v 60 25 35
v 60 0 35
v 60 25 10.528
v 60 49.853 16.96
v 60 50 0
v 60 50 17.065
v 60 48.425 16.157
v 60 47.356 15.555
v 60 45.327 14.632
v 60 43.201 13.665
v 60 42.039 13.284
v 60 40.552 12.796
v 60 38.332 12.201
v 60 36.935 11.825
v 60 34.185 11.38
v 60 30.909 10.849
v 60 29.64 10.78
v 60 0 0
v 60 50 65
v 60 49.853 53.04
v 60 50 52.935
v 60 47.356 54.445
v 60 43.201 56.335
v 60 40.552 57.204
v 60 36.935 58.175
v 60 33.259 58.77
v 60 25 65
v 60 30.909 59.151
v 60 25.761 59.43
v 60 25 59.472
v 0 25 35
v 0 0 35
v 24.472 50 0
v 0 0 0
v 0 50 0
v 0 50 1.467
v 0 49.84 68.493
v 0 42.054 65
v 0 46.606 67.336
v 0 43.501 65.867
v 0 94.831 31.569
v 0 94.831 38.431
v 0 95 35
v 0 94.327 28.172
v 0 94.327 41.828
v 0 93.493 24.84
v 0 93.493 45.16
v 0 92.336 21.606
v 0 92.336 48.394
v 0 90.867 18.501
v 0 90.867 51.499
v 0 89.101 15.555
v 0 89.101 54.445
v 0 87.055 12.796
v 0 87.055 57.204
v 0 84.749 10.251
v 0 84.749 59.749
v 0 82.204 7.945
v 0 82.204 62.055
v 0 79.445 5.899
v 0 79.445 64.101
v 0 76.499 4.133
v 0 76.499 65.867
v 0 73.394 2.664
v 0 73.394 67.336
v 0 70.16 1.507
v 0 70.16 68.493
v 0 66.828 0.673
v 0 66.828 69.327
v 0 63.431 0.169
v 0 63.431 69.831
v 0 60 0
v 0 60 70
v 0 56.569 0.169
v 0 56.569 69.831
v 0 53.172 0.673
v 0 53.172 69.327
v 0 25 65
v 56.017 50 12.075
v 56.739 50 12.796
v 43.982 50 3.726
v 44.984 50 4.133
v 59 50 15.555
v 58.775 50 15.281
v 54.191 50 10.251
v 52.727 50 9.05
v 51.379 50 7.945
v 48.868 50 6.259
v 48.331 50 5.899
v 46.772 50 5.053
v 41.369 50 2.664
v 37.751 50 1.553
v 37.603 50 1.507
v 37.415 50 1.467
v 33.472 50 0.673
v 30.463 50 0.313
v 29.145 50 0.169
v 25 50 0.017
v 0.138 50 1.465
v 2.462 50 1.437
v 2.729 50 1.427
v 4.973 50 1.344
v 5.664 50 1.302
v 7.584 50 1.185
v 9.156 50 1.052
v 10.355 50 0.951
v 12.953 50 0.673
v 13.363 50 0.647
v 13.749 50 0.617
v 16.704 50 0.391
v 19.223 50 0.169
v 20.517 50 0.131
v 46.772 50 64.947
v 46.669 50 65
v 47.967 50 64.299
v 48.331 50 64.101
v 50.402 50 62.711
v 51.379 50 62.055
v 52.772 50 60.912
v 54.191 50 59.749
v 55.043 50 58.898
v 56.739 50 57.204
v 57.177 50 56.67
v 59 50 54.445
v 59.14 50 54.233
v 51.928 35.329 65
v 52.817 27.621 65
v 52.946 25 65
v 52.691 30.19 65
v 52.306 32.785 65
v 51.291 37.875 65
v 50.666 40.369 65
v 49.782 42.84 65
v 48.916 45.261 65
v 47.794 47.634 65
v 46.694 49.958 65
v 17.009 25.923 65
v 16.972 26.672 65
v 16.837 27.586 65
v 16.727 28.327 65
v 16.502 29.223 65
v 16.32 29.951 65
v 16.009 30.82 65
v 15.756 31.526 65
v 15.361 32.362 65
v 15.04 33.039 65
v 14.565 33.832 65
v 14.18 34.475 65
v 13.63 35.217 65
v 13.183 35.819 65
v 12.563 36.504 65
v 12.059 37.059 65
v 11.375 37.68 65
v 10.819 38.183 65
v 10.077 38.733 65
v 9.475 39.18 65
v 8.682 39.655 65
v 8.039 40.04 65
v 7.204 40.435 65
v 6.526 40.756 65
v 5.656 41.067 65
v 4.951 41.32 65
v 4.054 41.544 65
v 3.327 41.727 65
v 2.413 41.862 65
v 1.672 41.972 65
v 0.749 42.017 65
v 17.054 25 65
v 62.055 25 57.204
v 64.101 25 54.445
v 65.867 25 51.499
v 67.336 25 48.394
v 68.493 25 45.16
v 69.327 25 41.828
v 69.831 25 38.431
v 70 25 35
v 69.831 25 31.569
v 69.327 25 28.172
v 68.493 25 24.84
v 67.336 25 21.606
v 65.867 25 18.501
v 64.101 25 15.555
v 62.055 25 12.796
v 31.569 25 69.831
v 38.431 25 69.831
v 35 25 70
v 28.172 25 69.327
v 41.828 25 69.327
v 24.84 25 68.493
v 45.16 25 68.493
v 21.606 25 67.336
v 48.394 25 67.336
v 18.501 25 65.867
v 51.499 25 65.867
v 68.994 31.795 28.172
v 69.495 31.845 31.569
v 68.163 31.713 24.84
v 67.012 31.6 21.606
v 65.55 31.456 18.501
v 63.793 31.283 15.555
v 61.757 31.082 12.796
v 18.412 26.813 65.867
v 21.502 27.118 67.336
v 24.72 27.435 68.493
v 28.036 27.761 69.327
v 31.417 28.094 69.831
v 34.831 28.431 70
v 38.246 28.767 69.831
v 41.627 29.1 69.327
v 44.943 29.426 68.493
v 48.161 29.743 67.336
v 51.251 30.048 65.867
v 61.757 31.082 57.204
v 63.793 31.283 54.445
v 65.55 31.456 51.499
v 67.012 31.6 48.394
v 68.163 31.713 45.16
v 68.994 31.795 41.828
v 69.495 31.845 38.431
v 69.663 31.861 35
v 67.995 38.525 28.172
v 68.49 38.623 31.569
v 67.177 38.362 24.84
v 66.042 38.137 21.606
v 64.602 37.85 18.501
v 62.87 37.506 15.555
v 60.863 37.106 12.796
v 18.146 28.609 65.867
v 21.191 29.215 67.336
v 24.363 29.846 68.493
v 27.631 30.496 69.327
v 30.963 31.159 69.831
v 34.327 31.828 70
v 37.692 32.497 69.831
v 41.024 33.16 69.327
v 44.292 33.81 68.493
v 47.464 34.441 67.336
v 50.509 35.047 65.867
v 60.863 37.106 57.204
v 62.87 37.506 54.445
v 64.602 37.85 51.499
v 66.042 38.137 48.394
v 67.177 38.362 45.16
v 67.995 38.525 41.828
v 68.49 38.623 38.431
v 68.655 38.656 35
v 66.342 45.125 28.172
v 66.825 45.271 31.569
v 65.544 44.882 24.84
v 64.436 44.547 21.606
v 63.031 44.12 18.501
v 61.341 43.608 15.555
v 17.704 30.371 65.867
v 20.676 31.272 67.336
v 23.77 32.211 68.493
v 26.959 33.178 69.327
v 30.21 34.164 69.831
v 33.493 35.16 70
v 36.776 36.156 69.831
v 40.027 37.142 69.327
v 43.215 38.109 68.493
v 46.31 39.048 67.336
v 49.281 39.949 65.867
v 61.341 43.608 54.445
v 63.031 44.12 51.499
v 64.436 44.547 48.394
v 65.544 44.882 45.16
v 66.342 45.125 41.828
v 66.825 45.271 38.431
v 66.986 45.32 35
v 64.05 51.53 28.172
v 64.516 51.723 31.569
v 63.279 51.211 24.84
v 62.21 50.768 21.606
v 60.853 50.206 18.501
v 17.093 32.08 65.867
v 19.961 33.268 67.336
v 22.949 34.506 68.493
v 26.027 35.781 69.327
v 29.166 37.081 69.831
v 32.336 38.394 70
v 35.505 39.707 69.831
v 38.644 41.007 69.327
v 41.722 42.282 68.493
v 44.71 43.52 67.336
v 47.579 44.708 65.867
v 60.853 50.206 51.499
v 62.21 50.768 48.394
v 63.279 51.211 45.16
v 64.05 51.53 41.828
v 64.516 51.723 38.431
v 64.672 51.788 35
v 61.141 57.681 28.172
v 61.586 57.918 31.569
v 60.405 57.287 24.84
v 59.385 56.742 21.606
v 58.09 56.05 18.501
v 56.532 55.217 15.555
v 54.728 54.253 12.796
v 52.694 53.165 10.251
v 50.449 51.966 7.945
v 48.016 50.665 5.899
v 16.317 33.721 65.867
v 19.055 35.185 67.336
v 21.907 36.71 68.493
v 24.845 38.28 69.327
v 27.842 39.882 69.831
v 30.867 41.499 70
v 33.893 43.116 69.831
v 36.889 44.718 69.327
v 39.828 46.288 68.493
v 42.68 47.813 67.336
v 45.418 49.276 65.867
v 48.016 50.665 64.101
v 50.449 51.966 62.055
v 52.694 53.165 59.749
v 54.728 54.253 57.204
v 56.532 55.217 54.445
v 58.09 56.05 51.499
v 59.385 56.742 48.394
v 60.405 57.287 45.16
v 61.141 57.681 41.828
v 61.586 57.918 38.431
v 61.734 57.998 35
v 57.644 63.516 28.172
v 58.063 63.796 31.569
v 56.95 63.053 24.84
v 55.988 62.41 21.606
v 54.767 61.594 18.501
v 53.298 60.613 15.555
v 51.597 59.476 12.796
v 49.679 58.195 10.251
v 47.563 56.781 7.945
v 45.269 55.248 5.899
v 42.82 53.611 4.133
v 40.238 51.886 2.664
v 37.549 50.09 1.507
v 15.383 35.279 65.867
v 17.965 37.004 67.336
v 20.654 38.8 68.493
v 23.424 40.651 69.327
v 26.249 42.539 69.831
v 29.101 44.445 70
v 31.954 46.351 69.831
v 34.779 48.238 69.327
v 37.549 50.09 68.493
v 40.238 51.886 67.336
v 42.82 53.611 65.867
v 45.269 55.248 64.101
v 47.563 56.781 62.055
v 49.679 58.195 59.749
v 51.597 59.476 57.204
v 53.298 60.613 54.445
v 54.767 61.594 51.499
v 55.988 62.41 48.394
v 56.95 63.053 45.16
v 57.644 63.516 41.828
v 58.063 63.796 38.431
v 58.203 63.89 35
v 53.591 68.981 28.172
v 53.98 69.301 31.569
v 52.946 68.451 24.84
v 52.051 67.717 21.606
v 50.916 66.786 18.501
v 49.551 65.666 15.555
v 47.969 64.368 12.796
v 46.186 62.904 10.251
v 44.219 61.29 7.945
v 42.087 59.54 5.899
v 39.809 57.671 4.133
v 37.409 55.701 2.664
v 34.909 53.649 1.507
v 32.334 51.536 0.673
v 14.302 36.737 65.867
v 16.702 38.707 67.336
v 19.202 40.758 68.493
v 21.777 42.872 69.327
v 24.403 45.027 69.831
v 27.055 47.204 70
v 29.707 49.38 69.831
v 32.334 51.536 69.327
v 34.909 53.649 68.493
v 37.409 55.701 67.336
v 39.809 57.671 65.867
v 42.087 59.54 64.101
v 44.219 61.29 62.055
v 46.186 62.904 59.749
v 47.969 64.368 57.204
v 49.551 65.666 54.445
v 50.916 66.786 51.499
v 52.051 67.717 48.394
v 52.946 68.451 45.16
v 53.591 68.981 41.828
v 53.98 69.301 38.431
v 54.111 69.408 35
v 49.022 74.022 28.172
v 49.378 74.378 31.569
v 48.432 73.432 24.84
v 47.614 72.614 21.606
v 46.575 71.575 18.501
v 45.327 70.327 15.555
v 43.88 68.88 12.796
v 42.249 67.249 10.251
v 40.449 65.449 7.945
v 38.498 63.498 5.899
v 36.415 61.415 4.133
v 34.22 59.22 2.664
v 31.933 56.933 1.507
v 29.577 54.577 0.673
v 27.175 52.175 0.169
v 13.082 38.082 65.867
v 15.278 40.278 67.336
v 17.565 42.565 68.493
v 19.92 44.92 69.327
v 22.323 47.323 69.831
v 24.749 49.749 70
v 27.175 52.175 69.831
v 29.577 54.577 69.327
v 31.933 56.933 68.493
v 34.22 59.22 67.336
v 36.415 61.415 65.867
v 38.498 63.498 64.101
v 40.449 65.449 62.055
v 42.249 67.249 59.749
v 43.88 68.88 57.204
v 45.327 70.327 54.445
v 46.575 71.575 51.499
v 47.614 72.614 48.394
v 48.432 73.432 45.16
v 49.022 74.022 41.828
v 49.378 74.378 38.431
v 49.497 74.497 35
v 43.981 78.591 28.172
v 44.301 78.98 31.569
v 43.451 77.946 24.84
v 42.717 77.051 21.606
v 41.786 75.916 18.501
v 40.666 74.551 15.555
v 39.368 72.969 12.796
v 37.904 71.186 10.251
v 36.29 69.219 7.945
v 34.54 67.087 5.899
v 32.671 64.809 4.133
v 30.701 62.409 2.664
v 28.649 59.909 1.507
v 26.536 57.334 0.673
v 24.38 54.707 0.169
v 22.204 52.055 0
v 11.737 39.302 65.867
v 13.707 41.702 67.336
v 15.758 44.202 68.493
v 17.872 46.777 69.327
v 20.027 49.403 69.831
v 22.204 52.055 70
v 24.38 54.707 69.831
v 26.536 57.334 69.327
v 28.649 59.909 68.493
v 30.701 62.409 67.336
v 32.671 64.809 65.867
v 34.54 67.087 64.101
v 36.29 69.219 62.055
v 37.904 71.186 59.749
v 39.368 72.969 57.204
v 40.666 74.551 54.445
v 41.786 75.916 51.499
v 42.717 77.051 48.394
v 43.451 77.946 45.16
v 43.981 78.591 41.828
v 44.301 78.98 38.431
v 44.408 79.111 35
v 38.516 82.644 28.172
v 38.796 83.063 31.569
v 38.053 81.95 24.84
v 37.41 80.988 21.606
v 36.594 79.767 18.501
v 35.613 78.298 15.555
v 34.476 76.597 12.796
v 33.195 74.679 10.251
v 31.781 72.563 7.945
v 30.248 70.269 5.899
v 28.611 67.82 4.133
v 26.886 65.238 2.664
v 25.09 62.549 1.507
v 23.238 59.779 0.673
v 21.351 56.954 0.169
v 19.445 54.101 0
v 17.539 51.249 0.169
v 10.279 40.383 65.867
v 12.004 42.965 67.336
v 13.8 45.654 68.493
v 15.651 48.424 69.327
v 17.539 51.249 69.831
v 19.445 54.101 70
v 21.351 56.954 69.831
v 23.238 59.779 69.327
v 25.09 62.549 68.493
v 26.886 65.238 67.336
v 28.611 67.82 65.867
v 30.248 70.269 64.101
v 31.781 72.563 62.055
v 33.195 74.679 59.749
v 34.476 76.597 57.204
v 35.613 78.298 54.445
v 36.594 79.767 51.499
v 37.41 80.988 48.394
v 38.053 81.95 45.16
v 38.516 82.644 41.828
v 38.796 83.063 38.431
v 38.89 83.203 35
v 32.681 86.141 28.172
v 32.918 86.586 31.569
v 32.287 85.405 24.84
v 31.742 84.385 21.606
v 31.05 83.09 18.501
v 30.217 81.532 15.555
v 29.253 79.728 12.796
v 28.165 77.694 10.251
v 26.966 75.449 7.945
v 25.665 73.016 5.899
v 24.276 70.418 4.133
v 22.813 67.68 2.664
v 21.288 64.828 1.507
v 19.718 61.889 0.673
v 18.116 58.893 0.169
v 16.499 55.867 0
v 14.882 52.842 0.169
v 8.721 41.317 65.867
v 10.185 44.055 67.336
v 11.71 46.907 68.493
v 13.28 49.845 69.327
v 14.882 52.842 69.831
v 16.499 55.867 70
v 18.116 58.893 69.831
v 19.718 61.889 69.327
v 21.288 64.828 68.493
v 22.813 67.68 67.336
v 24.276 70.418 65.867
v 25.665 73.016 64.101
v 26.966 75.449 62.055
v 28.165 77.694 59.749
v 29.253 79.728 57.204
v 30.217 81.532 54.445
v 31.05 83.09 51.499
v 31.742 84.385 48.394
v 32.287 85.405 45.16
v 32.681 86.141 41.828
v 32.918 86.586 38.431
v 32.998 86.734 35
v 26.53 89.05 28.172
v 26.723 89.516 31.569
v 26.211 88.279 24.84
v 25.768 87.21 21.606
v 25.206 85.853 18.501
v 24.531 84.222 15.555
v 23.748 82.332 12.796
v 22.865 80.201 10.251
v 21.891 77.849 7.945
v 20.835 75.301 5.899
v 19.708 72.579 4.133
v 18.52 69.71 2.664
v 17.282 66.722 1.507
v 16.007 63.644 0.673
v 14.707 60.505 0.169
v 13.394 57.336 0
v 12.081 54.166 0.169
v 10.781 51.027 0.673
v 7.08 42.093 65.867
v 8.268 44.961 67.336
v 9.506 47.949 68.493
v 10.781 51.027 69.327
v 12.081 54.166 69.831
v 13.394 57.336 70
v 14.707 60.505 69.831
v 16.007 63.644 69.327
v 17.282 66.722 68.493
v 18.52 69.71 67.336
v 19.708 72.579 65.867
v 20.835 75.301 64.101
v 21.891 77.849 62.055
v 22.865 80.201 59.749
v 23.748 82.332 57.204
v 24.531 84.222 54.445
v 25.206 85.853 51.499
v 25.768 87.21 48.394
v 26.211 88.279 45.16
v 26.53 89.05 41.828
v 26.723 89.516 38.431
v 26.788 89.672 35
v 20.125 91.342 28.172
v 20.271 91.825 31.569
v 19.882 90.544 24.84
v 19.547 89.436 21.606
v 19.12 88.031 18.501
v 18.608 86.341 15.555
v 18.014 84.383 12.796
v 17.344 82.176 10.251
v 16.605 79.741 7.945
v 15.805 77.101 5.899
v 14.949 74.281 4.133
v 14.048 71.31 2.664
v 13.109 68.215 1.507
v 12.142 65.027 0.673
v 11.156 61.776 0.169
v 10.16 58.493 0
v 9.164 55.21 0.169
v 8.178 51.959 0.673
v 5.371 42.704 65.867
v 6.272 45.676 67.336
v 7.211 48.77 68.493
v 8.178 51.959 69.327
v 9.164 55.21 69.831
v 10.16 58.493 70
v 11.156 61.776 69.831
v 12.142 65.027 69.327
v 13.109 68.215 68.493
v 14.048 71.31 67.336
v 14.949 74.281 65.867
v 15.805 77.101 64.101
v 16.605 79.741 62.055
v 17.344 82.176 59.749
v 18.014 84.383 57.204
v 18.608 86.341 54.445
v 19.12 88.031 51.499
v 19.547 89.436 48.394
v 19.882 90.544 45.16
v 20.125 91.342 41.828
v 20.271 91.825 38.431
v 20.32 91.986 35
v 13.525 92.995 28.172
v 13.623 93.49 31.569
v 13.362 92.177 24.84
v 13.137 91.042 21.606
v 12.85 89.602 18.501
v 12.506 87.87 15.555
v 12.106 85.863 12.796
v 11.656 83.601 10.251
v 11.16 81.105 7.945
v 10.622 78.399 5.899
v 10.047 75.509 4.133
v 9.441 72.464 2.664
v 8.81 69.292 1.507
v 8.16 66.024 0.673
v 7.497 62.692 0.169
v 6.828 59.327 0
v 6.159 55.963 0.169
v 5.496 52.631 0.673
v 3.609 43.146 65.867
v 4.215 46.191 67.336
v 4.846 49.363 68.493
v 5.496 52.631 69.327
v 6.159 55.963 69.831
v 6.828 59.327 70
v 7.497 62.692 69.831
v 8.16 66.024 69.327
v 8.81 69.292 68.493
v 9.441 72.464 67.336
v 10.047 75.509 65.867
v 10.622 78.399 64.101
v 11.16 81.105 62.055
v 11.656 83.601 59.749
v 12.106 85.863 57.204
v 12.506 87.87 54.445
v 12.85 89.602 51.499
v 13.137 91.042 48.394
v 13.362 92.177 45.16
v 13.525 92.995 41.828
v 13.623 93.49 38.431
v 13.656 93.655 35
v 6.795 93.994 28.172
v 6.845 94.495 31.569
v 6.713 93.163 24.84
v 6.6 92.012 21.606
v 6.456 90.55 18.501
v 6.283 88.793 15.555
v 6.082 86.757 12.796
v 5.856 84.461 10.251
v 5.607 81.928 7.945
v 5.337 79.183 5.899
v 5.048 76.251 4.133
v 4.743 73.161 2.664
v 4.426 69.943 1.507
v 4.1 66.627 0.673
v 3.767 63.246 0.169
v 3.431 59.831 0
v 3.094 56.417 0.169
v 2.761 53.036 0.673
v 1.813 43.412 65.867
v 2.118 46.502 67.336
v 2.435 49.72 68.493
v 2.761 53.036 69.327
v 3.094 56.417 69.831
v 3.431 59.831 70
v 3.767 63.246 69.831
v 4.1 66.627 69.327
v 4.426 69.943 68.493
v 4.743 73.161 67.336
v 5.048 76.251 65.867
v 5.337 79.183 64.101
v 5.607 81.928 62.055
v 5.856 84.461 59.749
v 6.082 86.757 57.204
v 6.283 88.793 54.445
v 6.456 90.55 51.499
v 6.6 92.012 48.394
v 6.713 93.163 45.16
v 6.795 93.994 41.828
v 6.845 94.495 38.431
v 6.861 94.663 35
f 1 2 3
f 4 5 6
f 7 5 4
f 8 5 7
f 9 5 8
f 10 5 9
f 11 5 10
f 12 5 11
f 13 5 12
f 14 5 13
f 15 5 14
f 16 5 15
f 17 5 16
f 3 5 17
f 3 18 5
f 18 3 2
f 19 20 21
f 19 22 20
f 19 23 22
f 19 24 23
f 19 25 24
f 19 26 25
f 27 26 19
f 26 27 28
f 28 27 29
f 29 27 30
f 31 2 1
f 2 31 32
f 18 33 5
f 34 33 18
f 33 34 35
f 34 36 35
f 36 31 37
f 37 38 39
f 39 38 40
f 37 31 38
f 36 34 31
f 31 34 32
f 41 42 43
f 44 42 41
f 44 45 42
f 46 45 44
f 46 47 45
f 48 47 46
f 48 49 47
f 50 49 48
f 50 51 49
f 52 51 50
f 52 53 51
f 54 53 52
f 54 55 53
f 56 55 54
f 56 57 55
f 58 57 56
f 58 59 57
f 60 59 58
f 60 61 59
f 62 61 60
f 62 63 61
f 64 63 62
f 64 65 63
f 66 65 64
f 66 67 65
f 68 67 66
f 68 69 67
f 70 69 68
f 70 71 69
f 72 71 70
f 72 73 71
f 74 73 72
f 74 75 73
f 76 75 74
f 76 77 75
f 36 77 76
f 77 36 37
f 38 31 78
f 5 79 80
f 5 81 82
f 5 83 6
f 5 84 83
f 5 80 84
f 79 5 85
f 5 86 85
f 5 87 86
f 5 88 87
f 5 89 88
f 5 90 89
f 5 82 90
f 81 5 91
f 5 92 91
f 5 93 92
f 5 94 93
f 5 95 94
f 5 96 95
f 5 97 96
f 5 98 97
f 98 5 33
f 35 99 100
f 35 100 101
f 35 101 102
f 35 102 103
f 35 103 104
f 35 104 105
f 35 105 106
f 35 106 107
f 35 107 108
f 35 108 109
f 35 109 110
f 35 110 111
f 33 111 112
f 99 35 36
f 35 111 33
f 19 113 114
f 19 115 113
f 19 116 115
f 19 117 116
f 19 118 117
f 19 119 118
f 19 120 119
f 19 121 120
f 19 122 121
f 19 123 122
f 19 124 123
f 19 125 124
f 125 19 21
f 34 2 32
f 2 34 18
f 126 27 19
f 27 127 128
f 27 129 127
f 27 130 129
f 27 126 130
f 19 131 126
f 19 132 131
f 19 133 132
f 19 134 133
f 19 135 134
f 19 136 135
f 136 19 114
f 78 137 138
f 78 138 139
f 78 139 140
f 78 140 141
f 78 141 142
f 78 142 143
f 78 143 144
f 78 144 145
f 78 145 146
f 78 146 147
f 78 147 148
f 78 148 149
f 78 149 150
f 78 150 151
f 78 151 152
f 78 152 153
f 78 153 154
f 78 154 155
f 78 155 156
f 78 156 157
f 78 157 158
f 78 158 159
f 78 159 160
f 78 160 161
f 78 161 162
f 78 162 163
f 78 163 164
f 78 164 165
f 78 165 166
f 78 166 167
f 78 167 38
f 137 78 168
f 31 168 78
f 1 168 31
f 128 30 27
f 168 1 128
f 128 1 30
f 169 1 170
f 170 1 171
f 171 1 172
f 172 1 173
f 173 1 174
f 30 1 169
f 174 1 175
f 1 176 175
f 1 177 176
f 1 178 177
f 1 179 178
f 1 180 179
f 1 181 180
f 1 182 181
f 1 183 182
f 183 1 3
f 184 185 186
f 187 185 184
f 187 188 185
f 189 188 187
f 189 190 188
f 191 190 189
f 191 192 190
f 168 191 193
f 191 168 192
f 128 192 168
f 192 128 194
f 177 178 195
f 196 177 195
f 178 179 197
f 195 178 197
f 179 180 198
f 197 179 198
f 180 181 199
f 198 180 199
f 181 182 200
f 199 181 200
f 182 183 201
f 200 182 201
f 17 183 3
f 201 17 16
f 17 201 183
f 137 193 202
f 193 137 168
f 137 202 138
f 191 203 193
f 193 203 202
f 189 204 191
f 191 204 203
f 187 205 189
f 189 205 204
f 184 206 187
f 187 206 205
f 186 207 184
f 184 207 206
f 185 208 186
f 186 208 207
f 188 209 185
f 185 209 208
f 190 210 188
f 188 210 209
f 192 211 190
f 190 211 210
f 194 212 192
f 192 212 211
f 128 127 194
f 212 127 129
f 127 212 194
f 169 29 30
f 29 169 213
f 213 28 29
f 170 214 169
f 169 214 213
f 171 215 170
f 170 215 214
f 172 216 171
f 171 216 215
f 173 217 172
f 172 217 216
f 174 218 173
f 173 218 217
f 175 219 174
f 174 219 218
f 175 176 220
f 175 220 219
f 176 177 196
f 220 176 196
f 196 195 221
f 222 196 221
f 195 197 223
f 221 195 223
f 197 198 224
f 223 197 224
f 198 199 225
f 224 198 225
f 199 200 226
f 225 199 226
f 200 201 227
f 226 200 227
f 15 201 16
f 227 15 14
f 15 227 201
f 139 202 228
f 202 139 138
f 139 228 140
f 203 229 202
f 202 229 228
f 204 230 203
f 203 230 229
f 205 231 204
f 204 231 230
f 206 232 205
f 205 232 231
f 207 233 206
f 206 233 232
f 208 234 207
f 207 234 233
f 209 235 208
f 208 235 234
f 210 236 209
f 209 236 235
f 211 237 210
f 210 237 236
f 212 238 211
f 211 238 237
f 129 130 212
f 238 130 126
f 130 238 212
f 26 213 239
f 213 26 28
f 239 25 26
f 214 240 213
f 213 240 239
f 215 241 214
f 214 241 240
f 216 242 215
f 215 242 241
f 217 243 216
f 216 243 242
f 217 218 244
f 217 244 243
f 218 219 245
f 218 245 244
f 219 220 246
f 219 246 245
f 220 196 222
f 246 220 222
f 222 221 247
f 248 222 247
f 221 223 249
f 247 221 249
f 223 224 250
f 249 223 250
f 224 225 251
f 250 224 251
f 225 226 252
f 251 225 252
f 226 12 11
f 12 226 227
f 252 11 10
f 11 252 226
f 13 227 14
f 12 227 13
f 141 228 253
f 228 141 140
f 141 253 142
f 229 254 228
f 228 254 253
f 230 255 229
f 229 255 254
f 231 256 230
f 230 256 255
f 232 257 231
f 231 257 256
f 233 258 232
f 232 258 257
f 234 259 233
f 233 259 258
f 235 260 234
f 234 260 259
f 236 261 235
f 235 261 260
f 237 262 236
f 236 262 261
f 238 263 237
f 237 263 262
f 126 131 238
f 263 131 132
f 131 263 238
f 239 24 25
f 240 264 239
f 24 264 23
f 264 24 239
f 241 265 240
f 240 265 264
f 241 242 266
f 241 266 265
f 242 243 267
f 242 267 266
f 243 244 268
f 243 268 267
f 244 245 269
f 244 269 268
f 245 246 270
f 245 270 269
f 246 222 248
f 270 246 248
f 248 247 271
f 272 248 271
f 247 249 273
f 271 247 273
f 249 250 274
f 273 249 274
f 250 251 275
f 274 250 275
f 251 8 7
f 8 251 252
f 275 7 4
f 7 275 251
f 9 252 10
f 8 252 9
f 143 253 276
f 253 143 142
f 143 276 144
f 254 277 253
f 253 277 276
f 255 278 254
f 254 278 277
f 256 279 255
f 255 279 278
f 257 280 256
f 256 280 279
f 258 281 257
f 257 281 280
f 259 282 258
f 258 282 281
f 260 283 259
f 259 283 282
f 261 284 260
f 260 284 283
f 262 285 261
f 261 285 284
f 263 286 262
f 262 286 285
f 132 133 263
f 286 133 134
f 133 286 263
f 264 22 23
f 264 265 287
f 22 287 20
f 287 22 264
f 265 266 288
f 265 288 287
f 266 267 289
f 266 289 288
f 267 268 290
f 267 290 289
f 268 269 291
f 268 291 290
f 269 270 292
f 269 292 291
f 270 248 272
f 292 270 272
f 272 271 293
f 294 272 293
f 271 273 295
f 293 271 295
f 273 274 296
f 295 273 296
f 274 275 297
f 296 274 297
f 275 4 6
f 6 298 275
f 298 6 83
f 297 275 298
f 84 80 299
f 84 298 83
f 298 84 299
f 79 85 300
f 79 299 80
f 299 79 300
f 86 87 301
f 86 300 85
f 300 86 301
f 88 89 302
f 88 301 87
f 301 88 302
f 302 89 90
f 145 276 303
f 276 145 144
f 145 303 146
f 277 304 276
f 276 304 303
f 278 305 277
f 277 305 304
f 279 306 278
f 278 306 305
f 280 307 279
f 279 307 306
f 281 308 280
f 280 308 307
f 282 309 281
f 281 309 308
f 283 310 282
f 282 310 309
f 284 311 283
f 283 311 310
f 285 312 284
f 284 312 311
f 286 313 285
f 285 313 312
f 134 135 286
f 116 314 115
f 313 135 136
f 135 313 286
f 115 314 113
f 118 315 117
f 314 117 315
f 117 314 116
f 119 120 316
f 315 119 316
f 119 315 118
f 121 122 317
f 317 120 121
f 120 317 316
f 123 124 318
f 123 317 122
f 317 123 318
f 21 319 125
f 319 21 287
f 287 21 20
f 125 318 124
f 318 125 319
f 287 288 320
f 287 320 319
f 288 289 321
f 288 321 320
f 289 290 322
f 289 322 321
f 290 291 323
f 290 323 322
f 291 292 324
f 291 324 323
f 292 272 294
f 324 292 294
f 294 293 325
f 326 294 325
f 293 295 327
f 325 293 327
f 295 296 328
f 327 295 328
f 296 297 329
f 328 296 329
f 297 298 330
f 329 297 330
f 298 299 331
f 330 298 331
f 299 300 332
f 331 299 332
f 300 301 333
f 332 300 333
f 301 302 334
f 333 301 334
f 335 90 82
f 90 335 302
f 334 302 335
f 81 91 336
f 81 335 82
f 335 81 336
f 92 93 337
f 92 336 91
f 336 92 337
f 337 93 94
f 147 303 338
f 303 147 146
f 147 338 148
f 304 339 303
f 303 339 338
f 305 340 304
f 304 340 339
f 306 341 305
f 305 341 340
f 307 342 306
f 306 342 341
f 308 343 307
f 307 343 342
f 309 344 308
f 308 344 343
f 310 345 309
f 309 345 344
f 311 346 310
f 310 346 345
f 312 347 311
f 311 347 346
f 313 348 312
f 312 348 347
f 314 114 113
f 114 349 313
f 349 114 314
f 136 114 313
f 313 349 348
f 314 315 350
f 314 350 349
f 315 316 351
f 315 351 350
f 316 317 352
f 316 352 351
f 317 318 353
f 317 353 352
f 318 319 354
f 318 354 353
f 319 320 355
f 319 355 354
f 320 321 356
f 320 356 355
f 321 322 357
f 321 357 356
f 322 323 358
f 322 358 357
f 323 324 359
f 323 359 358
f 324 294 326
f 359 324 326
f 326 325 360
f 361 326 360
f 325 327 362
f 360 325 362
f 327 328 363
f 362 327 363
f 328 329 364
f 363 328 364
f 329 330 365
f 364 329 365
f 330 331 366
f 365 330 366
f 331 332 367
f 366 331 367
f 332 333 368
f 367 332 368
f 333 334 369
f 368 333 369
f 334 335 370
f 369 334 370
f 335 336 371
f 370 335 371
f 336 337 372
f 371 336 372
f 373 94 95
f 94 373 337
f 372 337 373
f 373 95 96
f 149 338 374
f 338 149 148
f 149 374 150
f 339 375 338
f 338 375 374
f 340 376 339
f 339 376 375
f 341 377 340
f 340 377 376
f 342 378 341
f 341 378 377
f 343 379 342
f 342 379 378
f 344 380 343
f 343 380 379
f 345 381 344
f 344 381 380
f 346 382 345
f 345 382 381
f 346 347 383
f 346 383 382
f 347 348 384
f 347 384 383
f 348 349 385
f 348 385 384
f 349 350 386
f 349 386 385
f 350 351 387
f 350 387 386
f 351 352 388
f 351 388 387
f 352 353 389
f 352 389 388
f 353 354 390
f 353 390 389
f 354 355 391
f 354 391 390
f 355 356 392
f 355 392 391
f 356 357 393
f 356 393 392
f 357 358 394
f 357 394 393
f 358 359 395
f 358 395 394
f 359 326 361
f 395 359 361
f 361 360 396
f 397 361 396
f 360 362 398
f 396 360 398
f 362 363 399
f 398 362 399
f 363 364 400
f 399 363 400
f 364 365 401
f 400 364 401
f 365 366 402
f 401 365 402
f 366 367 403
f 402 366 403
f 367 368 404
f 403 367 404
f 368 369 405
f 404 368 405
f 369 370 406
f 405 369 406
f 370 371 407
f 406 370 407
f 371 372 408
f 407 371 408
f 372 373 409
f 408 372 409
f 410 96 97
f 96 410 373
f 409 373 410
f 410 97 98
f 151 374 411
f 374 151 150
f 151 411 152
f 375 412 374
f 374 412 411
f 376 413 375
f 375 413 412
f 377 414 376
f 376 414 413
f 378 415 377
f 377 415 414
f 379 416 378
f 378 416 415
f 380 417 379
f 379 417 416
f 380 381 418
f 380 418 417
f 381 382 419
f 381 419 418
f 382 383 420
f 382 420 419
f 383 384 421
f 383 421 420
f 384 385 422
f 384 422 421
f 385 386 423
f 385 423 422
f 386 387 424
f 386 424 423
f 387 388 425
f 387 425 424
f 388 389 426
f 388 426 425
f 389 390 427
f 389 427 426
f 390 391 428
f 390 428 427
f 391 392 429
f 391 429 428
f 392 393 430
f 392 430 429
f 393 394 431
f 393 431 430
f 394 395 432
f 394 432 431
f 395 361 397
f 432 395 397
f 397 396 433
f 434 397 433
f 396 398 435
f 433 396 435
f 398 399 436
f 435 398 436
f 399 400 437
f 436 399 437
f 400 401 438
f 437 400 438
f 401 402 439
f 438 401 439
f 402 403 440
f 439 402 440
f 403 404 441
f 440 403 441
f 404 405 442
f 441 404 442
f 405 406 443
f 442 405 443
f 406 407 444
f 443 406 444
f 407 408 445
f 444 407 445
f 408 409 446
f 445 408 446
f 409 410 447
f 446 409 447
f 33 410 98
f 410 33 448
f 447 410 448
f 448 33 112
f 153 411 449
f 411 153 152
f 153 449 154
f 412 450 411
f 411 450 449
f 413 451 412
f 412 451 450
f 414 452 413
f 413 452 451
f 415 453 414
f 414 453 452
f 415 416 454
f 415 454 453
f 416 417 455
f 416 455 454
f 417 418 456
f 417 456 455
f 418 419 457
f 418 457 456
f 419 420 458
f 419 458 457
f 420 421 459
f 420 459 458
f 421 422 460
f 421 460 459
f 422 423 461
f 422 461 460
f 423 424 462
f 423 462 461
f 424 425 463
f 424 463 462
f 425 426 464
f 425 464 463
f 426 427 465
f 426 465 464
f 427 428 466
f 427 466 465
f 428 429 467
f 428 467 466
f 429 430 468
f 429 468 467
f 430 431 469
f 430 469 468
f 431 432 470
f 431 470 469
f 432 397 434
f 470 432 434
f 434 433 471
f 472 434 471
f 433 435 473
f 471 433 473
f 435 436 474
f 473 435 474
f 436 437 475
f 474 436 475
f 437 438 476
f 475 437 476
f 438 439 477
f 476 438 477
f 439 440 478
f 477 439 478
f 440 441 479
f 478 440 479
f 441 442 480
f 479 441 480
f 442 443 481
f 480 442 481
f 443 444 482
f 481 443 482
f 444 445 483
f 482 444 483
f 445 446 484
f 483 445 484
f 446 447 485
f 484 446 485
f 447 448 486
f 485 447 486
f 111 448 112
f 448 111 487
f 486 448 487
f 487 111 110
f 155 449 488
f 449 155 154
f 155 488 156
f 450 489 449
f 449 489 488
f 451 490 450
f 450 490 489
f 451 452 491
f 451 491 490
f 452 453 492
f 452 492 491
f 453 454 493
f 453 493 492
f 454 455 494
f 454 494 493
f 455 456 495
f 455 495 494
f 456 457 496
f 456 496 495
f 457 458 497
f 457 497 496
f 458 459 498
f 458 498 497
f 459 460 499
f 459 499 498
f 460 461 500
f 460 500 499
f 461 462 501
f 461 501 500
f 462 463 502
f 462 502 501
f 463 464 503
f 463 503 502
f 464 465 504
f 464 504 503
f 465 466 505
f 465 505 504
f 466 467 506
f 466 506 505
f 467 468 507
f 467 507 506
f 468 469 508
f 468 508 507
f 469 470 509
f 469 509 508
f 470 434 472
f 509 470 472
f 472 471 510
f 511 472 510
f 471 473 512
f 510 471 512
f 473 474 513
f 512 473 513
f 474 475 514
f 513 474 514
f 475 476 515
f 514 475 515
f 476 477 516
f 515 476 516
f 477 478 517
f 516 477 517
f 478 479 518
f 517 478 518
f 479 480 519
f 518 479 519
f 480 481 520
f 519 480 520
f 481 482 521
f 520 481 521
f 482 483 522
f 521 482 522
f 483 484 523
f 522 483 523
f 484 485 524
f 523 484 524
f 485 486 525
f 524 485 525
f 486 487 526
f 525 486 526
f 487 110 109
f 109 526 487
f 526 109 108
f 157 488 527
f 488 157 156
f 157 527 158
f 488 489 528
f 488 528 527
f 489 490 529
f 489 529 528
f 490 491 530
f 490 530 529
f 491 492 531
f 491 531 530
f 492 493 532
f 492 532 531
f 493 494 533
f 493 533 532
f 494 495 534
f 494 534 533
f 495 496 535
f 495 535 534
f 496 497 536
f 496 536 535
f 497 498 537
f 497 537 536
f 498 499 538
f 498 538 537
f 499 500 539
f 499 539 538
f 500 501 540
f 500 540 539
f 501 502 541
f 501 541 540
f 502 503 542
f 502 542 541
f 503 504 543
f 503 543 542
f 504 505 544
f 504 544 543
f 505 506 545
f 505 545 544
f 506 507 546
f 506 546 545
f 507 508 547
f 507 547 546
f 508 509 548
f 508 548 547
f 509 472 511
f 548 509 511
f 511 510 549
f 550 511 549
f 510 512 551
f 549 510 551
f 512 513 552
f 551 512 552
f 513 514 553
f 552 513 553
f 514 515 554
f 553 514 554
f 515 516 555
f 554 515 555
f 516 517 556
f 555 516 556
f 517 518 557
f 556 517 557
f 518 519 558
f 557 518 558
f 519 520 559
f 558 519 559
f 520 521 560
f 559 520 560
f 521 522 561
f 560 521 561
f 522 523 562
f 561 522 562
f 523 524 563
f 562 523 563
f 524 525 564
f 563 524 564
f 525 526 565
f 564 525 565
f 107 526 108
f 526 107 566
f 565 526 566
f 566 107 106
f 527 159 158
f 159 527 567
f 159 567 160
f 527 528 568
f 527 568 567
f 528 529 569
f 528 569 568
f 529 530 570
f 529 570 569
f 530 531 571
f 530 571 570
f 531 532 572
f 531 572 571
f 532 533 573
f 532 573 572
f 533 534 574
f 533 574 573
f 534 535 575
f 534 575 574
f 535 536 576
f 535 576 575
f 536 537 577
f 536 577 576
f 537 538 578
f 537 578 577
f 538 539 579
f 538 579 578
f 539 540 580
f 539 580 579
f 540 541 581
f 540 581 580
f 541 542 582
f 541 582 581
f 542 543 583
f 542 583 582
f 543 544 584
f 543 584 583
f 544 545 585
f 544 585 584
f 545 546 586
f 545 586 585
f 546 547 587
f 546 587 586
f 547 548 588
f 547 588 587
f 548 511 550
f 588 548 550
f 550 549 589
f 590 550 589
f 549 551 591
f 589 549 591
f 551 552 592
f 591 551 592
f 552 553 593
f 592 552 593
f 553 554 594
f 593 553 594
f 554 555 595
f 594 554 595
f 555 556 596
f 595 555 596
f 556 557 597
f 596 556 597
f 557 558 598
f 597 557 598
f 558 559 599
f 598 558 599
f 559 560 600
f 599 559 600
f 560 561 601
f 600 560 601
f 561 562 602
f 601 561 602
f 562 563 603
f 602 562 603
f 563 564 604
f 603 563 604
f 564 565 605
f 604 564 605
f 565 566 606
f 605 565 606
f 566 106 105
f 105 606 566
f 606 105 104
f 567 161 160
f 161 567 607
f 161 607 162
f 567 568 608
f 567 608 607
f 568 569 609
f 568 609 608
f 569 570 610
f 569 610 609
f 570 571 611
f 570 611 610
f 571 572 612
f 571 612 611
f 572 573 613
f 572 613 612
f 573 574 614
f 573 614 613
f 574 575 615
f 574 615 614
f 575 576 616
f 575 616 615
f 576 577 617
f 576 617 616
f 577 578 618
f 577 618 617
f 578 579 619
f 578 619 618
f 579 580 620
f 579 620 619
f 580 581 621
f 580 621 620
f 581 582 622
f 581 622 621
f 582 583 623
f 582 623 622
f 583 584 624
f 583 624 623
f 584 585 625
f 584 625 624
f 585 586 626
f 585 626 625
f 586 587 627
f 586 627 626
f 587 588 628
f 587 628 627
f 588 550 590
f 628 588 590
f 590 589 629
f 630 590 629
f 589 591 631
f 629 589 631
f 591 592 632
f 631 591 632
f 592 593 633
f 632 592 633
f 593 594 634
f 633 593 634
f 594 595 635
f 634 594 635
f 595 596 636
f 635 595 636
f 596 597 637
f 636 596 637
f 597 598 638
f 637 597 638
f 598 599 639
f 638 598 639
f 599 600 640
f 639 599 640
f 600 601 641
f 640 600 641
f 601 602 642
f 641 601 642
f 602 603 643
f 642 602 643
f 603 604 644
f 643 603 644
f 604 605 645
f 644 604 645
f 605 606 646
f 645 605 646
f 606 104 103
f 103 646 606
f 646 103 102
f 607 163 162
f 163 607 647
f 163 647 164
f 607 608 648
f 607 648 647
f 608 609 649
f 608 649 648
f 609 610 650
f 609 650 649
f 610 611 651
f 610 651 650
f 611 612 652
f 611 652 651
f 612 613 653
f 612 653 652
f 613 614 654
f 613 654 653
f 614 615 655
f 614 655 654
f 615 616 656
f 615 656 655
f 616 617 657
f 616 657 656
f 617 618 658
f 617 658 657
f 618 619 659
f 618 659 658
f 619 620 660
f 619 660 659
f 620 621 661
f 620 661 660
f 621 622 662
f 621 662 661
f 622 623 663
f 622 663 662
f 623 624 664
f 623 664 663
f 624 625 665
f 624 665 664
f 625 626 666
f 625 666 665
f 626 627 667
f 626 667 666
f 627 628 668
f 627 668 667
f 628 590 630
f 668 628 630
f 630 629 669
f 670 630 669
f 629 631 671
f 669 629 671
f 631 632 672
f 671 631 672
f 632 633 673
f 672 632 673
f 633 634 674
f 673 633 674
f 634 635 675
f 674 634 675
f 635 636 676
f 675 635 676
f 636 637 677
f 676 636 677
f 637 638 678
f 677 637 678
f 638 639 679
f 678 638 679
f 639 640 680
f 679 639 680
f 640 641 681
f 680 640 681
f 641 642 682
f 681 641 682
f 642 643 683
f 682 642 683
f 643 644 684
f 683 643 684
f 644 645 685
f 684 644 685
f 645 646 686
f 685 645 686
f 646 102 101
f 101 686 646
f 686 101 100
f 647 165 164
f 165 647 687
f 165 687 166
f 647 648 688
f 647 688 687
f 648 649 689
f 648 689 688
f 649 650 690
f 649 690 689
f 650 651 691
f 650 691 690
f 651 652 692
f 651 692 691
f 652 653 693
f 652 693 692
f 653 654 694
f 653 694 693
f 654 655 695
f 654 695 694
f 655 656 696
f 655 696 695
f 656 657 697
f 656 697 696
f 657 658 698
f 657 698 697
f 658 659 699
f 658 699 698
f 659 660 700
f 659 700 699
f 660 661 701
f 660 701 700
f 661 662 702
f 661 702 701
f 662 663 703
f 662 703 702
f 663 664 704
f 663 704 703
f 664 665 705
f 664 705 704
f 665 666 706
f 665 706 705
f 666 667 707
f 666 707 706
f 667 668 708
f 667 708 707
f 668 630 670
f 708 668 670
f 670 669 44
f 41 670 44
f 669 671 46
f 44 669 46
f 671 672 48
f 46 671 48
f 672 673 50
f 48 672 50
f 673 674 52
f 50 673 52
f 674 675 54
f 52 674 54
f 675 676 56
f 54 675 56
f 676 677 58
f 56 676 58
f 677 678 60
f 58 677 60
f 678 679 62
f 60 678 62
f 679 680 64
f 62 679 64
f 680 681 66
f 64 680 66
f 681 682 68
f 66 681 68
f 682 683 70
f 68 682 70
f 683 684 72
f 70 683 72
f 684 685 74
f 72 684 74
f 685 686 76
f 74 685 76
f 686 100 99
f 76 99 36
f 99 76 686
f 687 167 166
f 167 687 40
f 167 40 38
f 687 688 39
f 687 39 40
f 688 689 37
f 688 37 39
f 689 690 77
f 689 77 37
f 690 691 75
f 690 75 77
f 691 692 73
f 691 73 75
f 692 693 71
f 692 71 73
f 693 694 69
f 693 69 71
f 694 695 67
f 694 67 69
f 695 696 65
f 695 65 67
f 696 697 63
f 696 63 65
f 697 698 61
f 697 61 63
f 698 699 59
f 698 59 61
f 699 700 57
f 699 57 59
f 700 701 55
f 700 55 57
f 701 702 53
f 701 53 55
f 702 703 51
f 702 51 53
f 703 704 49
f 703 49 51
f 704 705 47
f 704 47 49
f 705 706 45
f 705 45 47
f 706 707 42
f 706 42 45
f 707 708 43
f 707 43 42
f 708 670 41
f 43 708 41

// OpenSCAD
// Define global settings for smoother curves
$fn = 64;

// --- Dimension Definitions ---

// Overall dimensions
total_height = 75;
base_width = 60;
base_depth = 50;
top_width = 25;

// Feature dimensions
hole_diameter = 25;
hole_depth = 65; // Through hole
hole_x_offset = 30.81;
hole_y_offset = 24.71;

fillet_radius = 35;
fillet_height = 45;

// Derived dimensions
base_height = 35;
top_height = total_height - fillet_height;

// --- Module Definitions ---

// Module for the base block
module base() {
    cube([base_width, base_depth, base_height]);
}

// Module for the top block
module top() {
    translate([0, base_depth - top_width, base_height])
    cube([base_width, top_width, top_height]);
}

// Module for the fillet
module fillet() {
    translate([0, base_depth - top_width, base_height])
    rotate_extrude(angle = 90)
    translate([fillet_radius, 0, 0])
    circle(r = fillet_radius);
}

// Module for the hole
module hole() {
    translate([hole_x_offset, hole_y_offset, base_height/2])
    cylinder(h = hole_depth, d = hole_diameter, center = true);
}

// --- Main Assembly Module ---

module main() {
    union() {
        base();
        top();
        fillet();
        difference(){
            union(){}
            hole();
        }
    }
}

main();
